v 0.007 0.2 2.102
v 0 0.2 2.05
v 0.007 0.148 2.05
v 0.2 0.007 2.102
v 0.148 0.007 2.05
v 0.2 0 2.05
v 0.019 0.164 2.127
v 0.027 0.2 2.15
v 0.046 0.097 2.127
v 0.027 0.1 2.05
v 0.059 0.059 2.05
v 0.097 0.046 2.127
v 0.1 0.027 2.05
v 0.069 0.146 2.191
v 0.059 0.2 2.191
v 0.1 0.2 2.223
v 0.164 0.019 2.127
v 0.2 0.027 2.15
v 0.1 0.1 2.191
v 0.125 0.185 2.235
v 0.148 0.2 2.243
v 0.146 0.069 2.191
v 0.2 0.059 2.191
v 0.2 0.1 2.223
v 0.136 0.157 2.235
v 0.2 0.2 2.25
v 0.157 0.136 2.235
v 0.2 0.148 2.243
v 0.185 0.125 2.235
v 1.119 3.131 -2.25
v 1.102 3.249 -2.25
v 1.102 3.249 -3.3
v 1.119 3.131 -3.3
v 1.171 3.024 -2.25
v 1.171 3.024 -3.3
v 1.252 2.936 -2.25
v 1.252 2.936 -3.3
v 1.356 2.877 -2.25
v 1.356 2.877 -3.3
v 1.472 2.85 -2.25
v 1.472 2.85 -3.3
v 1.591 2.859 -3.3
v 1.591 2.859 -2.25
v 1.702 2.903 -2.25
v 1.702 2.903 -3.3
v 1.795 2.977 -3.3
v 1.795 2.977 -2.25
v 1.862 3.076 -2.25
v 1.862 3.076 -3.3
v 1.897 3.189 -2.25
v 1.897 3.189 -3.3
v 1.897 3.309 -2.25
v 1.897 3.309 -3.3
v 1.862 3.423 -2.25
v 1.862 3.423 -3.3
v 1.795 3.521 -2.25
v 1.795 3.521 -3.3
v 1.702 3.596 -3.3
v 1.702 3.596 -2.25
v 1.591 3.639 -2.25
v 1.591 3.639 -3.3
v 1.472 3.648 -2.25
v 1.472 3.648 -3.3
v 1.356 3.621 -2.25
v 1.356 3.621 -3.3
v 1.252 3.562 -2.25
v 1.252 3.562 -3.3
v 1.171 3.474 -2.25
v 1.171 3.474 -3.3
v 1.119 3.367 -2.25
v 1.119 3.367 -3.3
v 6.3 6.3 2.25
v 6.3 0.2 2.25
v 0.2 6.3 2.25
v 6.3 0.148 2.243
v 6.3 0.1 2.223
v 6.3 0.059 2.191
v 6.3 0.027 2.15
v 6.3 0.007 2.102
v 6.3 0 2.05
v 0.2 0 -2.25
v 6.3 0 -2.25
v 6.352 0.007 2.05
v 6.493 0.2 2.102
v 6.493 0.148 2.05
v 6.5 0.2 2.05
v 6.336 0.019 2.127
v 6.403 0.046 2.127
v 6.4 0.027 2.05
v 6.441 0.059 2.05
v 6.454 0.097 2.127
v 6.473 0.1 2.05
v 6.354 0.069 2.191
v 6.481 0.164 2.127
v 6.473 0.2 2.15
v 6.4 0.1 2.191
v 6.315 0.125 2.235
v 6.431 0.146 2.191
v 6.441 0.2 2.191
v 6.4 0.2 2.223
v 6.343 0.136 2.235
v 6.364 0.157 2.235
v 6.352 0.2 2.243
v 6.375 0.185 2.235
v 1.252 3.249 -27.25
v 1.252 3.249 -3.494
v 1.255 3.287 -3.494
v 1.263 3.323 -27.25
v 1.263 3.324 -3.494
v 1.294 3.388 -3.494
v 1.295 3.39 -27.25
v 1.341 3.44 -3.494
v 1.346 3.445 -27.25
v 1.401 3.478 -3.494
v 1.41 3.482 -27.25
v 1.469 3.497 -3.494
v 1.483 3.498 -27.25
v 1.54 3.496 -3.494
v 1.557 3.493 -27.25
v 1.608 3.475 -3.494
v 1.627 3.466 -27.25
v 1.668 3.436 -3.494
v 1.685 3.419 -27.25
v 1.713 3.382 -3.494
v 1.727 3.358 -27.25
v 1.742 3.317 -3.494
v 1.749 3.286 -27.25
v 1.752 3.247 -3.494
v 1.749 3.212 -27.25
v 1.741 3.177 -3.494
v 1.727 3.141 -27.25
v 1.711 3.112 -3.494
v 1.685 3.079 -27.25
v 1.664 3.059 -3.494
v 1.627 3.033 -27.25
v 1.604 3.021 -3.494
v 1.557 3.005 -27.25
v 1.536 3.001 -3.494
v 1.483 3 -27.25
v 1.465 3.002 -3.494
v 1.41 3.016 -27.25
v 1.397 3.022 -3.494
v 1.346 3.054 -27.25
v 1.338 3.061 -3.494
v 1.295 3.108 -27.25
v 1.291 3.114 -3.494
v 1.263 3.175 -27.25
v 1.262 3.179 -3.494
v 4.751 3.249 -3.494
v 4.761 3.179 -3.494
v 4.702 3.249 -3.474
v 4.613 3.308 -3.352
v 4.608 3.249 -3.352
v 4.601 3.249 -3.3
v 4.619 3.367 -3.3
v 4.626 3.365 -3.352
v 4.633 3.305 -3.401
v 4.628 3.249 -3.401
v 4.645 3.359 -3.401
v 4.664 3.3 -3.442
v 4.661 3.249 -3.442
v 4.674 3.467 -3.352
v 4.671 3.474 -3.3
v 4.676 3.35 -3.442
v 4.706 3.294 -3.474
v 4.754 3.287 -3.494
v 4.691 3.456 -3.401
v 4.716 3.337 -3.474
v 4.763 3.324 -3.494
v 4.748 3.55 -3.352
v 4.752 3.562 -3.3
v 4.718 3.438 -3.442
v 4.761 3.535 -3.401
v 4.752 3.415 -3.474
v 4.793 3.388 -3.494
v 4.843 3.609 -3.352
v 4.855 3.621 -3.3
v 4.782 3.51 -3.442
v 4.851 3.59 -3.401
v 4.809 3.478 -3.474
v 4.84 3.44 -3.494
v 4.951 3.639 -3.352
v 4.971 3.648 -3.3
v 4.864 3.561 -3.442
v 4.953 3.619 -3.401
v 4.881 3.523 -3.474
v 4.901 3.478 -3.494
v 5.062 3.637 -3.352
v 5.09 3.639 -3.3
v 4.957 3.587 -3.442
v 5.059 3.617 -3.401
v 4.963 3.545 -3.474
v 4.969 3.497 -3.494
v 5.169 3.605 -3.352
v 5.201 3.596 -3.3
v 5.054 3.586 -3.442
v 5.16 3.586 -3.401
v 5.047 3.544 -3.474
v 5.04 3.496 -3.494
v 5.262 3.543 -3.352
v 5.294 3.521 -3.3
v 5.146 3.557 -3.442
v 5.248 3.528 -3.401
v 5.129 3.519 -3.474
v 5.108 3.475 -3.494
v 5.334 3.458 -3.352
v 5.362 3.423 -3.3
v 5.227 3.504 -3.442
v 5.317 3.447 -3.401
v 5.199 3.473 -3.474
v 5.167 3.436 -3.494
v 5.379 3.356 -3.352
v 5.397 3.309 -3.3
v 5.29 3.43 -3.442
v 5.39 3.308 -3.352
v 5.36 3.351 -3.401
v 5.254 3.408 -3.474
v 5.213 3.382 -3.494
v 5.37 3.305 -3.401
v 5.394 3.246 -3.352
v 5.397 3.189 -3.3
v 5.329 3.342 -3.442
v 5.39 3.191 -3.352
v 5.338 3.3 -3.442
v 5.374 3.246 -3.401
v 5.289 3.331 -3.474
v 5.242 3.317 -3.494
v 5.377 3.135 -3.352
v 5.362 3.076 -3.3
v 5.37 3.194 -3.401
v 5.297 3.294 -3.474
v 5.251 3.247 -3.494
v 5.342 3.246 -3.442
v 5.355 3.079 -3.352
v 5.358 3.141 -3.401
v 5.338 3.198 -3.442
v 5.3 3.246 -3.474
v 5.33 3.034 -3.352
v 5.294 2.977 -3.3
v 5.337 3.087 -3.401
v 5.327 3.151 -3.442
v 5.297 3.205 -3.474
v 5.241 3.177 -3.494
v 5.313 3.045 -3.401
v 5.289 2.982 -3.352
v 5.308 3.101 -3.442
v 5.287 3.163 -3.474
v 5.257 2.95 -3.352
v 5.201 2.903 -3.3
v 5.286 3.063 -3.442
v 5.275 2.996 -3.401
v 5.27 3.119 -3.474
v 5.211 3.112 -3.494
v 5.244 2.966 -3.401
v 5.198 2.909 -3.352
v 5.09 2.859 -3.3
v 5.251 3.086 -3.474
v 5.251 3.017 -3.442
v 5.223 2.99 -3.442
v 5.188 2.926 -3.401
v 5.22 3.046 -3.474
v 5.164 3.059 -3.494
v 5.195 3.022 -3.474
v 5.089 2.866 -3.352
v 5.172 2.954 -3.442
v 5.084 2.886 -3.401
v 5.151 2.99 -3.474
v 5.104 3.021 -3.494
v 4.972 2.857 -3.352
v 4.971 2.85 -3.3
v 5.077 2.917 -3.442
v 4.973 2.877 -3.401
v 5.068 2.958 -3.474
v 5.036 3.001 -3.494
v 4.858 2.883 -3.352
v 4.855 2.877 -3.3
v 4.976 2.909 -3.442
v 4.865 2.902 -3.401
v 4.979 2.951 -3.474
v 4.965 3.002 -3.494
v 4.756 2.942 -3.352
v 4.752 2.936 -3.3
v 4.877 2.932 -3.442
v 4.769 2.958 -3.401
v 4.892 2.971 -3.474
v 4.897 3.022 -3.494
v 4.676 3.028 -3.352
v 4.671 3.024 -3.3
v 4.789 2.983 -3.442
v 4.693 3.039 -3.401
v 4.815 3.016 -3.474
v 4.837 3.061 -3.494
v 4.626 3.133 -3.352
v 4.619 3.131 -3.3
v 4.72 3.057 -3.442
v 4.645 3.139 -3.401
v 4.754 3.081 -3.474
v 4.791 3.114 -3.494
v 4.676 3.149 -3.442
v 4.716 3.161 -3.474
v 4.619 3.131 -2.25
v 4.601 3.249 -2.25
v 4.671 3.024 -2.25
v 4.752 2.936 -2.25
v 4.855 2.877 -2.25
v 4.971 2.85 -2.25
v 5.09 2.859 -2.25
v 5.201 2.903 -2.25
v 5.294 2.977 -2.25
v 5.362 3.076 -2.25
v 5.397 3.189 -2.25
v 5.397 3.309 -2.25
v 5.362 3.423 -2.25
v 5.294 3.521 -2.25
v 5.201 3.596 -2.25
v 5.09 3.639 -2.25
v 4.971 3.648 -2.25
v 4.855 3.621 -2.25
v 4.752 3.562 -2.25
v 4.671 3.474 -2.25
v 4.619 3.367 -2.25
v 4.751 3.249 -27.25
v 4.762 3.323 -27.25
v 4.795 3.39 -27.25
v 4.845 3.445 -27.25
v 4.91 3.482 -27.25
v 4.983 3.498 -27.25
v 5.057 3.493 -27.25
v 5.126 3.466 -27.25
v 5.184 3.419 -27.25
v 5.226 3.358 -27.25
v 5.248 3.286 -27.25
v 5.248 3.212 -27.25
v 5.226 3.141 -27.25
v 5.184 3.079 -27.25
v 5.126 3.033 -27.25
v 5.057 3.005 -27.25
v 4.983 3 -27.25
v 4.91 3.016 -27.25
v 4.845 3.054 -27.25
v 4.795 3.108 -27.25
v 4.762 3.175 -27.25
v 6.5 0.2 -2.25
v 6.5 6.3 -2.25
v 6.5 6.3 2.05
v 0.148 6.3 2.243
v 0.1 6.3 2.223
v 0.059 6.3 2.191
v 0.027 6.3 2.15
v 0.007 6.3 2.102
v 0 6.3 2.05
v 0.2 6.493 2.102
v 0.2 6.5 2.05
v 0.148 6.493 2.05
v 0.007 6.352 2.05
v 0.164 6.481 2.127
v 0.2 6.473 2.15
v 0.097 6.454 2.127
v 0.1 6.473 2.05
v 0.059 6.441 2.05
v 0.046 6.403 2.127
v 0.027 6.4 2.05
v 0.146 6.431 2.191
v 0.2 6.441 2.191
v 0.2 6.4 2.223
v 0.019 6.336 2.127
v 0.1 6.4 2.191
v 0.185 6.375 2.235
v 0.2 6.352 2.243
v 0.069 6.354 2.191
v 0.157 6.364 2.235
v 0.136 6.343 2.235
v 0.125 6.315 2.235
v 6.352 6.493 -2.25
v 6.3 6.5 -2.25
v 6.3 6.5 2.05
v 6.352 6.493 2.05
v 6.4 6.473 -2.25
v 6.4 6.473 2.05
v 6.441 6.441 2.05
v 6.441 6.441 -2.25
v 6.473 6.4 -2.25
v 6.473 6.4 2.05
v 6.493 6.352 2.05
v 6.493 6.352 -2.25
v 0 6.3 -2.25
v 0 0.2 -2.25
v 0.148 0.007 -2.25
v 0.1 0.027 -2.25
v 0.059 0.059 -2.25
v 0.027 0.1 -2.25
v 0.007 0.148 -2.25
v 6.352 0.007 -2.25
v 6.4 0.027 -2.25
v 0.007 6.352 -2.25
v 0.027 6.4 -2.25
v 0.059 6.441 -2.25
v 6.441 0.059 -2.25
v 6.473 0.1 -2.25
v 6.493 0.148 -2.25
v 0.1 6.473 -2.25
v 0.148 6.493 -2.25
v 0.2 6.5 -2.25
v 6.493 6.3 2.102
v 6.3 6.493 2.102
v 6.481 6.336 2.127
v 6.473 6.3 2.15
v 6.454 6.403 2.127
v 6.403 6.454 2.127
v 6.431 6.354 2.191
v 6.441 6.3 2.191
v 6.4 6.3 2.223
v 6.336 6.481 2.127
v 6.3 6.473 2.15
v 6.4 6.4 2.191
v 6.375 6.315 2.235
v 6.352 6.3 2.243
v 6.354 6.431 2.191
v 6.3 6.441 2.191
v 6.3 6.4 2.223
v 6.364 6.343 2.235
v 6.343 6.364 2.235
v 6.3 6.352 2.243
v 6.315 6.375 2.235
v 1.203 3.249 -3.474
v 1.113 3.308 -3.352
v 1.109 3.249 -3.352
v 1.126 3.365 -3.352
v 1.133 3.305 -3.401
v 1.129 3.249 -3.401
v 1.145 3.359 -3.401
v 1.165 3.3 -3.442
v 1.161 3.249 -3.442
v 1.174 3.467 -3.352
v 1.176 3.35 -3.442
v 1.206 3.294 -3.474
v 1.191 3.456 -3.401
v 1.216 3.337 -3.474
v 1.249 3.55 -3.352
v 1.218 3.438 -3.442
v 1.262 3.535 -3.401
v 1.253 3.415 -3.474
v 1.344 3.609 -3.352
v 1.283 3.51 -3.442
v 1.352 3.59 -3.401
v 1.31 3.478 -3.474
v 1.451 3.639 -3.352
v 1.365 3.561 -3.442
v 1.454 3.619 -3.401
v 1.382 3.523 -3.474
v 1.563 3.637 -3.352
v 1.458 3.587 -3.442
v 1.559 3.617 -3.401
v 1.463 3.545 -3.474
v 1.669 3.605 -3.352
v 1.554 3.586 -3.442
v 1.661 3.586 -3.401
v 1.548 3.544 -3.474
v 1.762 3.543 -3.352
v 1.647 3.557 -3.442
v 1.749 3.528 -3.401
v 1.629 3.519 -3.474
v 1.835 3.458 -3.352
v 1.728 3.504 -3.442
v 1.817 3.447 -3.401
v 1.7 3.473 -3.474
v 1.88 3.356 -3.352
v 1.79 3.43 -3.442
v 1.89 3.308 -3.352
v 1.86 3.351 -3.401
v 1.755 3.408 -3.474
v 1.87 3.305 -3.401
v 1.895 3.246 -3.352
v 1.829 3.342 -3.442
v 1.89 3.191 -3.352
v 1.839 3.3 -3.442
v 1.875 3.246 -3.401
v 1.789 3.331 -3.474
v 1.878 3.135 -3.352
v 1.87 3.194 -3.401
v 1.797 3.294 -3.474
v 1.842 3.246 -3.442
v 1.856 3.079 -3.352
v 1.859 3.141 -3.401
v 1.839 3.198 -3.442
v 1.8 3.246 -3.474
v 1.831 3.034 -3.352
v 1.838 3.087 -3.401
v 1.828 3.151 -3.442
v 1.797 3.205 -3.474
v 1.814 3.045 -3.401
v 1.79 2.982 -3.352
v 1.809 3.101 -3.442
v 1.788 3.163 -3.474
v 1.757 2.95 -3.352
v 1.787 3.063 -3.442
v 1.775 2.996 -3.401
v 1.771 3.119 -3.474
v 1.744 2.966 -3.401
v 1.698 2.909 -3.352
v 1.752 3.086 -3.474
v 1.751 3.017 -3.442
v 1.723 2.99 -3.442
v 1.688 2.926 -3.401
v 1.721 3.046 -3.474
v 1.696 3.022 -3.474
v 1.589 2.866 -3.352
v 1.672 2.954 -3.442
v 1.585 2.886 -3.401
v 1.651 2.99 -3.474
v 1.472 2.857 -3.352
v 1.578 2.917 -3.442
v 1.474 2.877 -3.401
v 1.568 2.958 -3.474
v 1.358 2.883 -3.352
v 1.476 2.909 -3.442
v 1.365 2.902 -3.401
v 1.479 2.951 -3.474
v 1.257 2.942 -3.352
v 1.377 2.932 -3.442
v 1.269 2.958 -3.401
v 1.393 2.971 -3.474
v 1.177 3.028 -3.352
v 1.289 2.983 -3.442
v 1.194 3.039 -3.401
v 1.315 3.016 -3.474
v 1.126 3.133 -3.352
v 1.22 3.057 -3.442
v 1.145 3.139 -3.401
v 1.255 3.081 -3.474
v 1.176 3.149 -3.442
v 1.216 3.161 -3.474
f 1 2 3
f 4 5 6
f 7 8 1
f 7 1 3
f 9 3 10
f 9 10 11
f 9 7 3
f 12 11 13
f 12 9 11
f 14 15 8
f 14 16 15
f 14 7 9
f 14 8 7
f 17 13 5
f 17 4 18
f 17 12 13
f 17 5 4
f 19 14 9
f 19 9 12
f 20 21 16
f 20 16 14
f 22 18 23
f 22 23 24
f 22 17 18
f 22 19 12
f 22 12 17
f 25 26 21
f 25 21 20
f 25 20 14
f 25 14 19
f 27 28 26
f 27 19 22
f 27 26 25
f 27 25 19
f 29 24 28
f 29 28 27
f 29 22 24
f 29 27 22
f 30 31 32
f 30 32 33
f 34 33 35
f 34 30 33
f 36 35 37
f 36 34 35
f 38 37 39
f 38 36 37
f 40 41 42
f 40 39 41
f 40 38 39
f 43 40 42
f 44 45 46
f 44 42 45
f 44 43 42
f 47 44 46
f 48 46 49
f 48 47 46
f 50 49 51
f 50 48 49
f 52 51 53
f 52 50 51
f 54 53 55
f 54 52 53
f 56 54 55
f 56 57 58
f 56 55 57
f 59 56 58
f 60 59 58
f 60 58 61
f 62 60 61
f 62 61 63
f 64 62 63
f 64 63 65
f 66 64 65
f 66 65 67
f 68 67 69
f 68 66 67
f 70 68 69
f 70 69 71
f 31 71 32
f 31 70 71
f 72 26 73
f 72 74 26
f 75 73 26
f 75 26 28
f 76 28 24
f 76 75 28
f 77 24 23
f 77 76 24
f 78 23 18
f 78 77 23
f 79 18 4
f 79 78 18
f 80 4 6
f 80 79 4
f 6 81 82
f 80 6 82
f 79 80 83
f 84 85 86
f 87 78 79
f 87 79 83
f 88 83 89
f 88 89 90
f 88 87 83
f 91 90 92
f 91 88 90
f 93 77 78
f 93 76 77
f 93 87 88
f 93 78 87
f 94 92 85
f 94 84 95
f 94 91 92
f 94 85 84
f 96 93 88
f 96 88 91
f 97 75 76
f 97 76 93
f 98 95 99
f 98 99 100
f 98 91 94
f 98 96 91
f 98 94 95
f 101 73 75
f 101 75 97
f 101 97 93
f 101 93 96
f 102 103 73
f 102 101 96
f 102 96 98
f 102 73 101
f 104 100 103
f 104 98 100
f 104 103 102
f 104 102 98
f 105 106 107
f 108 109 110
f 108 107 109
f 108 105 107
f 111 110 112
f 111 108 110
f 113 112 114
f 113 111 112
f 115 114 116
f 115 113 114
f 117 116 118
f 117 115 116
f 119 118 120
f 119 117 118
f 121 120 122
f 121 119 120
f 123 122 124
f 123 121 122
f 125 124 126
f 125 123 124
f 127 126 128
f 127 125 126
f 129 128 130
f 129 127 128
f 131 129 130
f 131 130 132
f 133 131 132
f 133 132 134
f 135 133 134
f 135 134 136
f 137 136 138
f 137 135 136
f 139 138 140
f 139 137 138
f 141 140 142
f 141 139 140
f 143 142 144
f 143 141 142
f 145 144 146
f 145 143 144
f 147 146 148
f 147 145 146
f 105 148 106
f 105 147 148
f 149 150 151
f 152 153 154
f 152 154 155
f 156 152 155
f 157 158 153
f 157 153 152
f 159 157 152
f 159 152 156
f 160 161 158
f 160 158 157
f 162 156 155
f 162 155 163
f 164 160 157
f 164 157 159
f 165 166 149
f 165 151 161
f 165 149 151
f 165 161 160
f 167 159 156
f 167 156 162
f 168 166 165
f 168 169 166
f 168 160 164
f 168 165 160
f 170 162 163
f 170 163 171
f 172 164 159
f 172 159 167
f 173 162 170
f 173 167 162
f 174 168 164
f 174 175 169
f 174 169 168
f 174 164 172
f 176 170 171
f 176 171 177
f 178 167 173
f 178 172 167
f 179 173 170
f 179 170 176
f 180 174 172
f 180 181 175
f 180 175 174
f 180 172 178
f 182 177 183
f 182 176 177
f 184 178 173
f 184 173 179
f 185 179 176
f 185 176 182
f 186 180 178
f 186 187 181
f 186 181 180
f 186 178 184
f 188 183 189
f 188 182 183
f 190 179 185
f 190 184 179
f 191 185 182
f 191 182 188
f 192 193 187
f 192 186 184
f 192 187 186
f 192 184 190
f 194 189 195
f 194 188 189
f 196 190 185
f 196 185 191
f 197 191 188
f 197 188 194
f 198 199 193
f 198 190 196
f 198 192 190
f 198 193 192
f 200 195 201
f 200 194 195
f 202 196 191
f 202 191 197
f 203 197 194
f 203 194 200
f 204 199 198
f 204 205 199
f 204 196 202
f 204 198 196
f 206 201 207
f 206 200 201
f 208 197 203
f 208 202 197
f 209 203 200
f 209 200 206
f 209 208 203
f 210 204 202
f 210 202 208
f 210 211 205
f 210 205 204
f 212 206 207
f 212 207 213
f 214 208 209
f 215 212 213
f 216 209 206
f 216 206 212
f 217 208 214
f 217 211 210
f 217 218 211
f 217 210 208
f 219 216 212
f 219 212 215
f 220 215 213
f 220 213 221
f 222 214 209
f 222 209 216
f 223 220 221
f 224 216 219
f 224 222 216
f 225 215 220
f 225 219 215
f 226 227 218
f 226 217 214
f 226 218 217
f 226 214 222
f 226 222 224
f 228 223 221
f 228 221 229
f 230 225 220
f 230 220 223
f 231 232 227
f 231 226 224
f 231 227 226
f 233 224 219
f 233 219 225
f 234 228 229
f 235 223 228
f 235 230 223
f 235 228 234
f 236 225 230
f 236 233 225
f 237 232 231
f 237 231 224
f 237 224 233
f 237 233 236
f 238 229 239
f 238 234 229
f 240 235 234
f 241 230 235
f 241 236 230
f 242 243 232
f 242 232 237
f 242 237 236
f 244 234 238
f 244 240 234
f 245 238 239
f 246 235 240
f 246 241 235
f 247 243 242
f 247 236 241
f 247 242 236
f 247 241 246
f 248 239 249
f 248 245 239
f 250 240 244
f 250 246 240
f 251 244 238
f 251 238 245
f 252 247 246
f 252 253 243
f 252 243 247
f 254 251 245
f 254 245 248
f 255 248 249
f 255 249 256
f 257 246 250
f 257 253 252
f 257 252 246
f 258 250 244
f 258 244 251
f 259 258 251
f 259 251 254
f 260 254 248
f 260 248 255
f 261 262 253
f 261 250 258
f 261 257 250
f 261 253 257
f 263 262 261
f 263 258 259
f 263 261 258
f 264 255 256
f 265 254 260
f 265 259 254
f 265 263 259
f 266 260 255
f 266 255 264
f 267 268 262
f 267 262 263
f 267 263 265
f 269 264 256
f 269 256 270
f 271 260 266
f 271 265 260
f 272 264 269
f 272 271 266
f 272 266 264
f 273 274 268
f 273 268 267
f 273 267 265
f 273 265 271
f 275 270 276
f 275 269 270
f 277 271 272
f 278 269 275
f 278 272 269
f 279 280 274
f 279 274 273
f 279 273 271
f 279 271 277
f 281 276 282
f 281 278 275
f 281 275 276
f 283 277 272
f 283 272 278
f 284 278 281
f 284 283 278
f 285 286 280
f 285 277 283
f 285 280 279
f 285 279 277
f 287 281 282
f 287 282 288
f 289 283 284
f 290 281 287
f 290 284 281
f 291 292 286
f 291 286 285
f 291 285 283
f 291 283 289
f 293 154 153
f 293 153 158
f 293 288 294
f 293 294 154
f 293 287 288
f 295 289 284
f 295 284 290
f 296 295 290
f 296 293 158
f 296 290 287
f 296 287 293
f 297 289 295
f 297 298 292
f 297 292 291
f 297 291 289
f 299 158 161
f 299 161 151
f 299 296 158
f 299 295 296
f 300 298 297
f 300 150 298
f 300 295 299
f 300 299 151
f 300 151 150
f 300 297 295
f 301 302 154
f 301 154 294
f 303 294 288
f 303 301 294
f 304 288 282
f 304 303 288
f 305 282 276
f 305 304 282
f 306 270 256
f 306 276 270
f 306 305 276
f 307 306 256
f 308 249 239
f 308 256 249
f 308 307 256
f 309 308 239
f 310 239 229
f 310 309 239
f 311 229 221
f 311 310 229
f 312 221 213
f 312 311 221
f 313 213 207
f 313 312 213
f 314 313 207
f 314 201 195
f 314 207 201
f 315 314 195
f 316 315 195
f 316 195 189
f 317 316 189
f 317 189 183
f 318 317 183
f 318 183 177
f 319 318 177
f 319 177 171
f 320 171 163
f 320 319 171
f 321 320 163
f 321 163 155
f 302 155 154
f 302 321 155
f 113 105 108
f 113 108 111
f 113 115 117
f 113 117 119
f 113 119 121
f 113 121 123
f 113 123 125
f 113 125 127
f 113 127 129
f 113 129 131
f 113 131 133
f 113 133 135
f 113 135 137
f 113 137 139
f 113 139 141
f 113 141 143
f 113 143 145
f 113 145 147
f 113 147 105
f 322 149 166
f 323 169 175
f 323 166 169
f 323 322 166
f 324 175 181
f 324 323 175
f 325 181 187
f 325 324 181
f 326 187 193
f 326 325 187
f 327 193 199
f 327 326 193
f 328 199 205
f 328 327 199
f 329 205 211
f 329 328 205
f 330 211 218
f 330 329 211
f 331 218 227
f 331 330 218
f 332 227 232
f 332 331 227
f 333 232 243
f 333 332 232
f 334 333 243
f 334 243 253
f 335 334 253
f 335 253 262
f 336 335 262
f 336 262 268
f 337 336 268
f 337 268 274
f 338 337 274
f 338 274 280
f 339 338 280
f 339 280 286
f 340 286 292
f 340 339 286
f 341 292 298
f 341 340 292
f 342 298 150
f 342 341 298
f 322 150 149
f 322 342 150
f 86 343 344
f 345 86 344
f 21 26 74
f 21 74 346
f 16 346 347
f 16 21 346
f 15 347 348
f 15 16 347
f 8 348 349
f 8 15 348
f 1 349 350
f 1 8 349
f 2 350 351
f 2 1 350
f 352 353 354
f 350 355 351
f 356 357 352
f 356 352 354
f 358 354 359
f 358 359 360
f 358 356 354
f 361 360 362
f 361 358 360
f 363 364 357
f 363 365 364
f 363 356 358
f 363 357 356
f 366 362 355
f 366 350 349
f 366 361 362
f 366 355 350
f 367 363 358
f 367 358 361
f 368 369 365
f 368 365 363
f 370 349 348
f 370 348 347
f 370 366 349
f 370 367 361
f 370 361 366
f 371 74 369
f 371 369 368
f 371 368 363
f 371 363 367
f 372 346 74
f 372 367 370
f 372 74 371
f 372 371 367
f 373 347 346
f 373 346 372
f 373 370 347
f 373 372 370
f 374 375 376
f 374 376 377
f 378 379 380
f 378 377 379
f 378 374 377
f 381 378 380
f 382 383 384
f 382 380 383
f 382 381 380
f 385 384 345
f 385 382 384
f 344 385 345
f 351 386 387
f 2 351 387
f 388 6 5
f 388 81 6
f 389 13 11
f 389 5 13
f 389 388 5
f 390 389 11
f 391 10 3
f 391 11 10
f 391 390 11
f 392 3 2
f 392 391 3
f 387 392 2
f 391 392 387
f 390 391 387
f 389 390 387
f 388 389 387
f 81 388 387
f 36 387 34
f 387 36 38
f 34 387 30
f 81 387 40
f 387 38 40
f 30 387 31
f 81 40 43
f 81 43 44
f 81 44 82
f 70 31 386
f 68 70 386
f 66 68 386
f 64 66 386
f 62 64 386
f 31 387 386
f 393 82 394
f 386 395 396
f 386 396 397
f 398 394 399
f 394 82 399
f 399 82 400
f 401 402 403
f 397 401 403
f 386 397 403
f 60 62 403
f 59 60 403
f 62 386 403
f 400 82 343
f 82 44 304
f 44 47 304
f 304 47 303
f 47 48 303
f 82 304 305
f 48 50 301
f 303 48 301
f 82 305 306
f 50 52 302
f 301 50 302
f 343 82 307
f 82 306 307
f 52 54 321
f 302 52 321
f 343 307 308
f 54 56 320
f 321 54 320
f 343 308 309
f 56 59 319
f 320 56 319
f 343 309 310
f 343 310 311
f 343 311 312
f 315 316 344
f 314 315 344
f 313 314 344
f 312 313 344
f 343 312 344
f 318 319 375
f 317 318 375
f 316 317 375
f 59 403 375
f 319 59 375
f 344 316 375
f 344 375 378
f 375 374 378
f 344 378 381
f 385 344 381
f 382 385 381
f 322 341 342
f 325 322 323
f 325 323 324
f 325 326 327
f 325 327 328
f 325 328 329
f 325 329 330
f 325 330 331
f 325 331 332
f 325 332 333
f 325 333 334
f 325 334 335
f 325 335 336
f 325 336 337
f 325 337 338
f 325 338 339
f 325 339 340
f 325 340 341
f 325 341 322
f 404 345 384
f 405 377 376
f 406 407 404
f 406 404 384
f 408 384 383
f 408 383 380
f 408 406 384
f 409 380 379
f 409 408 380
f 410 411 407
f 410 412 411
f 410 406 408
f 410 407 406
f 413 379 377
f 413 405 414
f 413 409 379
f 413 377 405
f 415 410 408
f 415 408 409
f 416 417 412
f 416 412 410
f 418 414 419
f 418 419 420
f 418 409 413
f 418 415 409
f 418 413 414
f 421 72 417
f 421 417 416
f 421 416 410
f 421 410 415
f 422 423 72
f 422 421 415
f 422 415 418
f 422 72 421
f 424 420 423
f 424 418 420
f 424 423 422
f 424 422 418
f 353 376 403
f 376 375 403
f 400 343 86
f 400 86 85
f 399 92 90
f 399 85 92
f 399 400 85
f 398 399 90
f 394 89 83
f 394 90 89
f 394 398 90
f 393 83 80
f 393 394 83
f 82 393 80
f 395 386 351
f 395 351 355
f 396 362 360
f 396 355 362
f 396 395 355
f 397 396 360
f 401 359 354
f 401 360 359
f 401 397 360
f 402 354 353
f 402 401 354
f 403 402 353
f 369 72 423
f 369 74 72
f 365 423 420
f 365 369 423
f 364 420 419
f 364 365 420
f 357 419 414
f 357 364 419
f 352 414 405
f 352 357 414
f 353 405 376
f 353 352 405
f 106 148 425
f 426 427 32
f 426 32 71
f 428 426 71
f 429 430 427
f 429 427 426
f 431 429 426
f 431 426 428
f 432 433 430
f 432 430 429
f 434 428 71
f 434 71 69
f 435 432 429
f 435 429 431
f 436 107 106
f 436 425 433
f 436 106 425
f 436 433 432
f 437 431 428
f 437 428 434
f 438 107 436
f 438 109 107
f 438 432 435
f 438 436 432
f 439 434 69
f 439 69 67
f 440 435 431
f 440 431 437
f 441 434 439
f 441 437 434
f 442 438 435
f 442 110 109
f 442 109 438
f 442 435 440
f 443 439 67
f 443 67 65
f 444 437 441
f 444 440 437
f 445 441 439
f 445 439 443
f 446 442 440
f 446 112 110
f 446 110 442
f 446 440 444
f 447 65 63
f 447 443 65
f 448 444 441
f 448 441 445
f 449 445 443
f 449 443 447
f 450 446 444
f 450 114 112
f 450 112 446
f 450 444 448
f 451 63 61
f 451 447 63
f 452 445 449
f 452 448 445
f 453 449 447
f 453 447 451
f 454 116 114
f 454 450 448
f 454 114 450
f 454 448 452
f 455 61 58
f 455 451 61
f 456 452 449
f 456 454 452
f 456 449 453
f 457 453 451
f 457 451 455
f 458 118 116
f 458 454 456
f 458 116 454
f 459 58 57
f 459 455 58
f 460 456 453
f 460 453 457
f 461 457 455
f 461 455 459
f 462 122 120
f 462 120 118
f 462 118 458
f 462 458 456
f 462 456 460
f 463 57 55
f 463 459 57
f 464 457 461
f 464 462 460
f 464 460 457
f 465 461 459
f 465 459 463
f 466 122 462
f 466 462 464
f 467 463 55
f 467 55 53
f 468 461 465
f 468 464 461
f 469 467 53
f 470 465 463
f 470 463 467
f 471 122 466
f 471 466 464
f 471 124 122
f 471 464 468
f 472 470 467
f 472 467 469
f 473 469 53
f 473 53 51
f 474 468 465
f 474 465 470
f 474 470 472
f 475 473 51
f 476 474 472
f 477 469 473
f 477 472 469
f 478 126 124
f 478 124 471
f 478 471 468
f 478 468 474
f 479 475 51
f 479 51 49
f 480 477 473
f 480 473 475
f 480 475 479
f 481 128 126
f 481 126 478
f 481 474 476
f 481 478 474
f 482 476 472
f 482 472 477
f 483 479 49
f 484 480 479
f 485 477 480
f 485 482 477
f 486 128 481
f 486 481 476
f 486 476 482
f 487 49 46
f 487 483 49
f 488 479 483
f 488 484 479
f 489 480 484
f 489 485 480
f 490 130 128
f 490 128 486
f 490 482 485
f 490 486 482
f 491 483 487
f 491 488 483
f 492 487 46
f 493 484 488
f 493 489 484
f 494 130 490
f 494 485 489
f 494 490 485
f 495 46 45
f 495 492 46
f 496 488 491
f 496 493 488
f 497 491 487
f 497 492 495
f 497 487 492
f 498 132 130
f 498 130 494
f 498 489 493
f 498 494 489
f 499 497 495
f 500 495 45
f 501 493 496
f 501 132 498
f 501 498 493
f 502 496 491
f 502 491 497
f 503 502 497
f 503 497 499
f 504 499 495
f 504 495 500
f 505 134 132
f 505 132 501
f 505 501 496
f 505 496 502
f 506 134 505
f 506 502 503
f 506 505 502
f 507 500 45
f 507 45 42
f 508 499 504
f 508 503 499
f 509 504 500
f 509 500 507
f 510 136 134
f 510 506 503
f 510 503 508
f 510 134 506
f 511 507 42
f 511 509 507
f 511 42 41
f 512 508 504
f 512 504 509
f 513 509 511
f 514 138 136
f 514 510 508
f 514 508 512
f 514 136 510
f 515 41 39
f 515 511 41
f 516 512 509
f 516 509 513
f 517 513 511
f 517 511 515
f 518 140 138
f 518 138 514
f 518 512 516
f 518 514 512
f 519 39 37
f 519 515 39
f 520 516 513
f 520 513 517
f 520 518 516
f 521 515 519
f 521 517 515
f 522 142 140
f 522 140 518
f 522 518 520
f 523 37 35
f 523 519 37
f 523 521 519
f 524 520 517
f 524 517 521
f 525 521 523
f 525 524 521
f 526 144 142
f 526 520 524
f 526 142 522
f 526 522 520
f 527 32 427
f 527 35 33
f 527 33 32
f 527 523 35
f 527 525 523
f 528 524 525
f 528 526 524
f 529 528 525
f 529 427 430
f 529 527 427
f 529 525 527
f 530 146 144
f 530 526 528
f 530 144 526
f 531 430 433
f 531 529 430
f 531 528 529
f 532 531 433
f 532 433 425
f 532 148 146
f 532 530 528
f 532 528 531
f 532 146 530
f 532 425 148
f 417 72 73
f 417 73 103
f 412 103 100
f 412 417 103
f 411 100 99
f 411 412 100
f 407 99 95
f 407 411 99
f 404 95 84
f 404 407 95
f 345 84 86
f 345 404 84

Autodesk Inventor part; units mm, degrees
sketch "Sketch1" plane through (0, 0, 0) normal (0, 0, 1) x (1, 0, 0)
  line L0 (0.2, 0) -> (6.3, 0)
  line L1 (6.5, 0.2) -> (6.5, 6.3)
  line L2 (6.3, 6.5) -> (0.2, 6.5)
  line L3 (0, 6.3) -> (0, 0.2)
  arc A0 (0.2, 6.5) -> (0, 6.3) centre (0.2, 6.3) ccw
  arc A1 (6.5, 6.3) -> (6.3, 6.5) centre (6.3, 6.3) ccw
  arc A2 (6.3, 0) -> (6.5, 0.2) centre (6.3, 0.2) ccw
  arc A3 (0, 0.2) -> (0.2, 0) centre (0.2, 0.2) ccw
  point P0 (0, 0)
  point P1 (6.5, 6.5)
  point P2 (6.5, 0)
  point P3 (0, 6.5)
  dimension "d0" = 6.5
  dimension "d1" = 6.5
  dimension "d2" = 0.2
extrude "Extrusion1" add sketch "Sketch1" along normal mid plane 4.5
fillet "Fillet1" radius 0.2 8 edges at (0.0586, 0.0586, 2.25) (3.25, 0, 2.25) (6.4414, 0.0586, 2.25) (6.5, 3.25, 2.25) (6.4414, 6.4414, 2.25) (3.25, 6.5, 2.25) (0.0586, 6.4414, 2.25) (0, 3.25, 2.25)
ref_plane "Work Plane1" through (0.2, 3.25, -2.25) normal (0, 1, 0) x (1, 0, 0)
sketch "Sketch2" plane through (0.2, 3.25, -2.25) normal (0, 1, 0) x (1, 0, 0)
  line L0 (1.3, 0) -> (1.3, 25)
  line L1 (4.8, 0) -> (4.8, 25)
  point P0 (-0.2, -2.25)
  point P1 (-0.2, 0)
  point P2 (6.3, 0)
  dimension "d6" = 1.5
  dimension "d7" = 1.5
  dimension "d8" = 25
  dimension "d9" = 25
sketch "Sketch3" plane through (0, 0, -2.25) normal (0, 0, -1) x (-1, 0, 0)
  circle A0 centre (-1.5017, 3.2491) radius 0.4
  circle A1 centre (-5.0012, 3.2491) radius 0.4
  point P0 (0, 0)
  dimension "d10" = 0.8
  dimension "d11" = 0.8
extrude "Extrusion2" add sketch "Sketch3" along normal blind 1.25 contours A0
extrude "Extrusion3" add sketch "Sketch3" along normal blind 1.25 contours A1
fillet "Fillet2" radius 0.2 2 edges at (1.9017, 3.2491, -3.5) (5.4012, 3.2491, -3.5)
ref_plane "Work Plane2" through (1.5017, 3.2491, -3.5) normal (0, 0, -1) x (-1, 0, 0)
ref_plane "Work Plane3" through (5.0012, 3.2491, -3.5) normal (0, 0, -1) x (-1, 0, 0)
sketch "Sketch4" plane through (1.5017, 3.2491, -3.5) normal (0, 0, -1) x (-1, 0, 0)
  circle A0 centre (0, 0) radius 0.25
  point P0 (1.5017, -3.2491)
  dimension "d19" = 0.5
sketch "Sketch5" plane through (5.0012, 3.2491, -3.5) normal (0, 0, -1) x (-1, 0, 0)
  circle A0 centre (0, 0) radius 0.25
  point P0 (5.0012, -3.2491)
  dimension "d20" = 0.5
sweep "Sweep1" add profiles "Sketch4" path "Sketch2" path curves L0
sweep "Sweep2" add profiles "Sketch5" path "Sketch2" path curves L1
equation "\"BendRadius\" = Thickness"
equation "\"BendReliefWidth\" = Thickness"
equation "\"BendReliefDepth\" = 0.5 * Thickness"
equation "\"CornerReliefSize\" = 4 * Thickness"
equation "\"MinimumRemnant\" = 2 * Thickness"
equation "\"TransitionRadius\" = BendRadius"
equation "\"JacobiRadiusSize\" = BendRadius"
equation "\"GapSize\" = Thickness"
equation "\"Thickness\" = 3.048"
properties part number "KM6A-H90"
